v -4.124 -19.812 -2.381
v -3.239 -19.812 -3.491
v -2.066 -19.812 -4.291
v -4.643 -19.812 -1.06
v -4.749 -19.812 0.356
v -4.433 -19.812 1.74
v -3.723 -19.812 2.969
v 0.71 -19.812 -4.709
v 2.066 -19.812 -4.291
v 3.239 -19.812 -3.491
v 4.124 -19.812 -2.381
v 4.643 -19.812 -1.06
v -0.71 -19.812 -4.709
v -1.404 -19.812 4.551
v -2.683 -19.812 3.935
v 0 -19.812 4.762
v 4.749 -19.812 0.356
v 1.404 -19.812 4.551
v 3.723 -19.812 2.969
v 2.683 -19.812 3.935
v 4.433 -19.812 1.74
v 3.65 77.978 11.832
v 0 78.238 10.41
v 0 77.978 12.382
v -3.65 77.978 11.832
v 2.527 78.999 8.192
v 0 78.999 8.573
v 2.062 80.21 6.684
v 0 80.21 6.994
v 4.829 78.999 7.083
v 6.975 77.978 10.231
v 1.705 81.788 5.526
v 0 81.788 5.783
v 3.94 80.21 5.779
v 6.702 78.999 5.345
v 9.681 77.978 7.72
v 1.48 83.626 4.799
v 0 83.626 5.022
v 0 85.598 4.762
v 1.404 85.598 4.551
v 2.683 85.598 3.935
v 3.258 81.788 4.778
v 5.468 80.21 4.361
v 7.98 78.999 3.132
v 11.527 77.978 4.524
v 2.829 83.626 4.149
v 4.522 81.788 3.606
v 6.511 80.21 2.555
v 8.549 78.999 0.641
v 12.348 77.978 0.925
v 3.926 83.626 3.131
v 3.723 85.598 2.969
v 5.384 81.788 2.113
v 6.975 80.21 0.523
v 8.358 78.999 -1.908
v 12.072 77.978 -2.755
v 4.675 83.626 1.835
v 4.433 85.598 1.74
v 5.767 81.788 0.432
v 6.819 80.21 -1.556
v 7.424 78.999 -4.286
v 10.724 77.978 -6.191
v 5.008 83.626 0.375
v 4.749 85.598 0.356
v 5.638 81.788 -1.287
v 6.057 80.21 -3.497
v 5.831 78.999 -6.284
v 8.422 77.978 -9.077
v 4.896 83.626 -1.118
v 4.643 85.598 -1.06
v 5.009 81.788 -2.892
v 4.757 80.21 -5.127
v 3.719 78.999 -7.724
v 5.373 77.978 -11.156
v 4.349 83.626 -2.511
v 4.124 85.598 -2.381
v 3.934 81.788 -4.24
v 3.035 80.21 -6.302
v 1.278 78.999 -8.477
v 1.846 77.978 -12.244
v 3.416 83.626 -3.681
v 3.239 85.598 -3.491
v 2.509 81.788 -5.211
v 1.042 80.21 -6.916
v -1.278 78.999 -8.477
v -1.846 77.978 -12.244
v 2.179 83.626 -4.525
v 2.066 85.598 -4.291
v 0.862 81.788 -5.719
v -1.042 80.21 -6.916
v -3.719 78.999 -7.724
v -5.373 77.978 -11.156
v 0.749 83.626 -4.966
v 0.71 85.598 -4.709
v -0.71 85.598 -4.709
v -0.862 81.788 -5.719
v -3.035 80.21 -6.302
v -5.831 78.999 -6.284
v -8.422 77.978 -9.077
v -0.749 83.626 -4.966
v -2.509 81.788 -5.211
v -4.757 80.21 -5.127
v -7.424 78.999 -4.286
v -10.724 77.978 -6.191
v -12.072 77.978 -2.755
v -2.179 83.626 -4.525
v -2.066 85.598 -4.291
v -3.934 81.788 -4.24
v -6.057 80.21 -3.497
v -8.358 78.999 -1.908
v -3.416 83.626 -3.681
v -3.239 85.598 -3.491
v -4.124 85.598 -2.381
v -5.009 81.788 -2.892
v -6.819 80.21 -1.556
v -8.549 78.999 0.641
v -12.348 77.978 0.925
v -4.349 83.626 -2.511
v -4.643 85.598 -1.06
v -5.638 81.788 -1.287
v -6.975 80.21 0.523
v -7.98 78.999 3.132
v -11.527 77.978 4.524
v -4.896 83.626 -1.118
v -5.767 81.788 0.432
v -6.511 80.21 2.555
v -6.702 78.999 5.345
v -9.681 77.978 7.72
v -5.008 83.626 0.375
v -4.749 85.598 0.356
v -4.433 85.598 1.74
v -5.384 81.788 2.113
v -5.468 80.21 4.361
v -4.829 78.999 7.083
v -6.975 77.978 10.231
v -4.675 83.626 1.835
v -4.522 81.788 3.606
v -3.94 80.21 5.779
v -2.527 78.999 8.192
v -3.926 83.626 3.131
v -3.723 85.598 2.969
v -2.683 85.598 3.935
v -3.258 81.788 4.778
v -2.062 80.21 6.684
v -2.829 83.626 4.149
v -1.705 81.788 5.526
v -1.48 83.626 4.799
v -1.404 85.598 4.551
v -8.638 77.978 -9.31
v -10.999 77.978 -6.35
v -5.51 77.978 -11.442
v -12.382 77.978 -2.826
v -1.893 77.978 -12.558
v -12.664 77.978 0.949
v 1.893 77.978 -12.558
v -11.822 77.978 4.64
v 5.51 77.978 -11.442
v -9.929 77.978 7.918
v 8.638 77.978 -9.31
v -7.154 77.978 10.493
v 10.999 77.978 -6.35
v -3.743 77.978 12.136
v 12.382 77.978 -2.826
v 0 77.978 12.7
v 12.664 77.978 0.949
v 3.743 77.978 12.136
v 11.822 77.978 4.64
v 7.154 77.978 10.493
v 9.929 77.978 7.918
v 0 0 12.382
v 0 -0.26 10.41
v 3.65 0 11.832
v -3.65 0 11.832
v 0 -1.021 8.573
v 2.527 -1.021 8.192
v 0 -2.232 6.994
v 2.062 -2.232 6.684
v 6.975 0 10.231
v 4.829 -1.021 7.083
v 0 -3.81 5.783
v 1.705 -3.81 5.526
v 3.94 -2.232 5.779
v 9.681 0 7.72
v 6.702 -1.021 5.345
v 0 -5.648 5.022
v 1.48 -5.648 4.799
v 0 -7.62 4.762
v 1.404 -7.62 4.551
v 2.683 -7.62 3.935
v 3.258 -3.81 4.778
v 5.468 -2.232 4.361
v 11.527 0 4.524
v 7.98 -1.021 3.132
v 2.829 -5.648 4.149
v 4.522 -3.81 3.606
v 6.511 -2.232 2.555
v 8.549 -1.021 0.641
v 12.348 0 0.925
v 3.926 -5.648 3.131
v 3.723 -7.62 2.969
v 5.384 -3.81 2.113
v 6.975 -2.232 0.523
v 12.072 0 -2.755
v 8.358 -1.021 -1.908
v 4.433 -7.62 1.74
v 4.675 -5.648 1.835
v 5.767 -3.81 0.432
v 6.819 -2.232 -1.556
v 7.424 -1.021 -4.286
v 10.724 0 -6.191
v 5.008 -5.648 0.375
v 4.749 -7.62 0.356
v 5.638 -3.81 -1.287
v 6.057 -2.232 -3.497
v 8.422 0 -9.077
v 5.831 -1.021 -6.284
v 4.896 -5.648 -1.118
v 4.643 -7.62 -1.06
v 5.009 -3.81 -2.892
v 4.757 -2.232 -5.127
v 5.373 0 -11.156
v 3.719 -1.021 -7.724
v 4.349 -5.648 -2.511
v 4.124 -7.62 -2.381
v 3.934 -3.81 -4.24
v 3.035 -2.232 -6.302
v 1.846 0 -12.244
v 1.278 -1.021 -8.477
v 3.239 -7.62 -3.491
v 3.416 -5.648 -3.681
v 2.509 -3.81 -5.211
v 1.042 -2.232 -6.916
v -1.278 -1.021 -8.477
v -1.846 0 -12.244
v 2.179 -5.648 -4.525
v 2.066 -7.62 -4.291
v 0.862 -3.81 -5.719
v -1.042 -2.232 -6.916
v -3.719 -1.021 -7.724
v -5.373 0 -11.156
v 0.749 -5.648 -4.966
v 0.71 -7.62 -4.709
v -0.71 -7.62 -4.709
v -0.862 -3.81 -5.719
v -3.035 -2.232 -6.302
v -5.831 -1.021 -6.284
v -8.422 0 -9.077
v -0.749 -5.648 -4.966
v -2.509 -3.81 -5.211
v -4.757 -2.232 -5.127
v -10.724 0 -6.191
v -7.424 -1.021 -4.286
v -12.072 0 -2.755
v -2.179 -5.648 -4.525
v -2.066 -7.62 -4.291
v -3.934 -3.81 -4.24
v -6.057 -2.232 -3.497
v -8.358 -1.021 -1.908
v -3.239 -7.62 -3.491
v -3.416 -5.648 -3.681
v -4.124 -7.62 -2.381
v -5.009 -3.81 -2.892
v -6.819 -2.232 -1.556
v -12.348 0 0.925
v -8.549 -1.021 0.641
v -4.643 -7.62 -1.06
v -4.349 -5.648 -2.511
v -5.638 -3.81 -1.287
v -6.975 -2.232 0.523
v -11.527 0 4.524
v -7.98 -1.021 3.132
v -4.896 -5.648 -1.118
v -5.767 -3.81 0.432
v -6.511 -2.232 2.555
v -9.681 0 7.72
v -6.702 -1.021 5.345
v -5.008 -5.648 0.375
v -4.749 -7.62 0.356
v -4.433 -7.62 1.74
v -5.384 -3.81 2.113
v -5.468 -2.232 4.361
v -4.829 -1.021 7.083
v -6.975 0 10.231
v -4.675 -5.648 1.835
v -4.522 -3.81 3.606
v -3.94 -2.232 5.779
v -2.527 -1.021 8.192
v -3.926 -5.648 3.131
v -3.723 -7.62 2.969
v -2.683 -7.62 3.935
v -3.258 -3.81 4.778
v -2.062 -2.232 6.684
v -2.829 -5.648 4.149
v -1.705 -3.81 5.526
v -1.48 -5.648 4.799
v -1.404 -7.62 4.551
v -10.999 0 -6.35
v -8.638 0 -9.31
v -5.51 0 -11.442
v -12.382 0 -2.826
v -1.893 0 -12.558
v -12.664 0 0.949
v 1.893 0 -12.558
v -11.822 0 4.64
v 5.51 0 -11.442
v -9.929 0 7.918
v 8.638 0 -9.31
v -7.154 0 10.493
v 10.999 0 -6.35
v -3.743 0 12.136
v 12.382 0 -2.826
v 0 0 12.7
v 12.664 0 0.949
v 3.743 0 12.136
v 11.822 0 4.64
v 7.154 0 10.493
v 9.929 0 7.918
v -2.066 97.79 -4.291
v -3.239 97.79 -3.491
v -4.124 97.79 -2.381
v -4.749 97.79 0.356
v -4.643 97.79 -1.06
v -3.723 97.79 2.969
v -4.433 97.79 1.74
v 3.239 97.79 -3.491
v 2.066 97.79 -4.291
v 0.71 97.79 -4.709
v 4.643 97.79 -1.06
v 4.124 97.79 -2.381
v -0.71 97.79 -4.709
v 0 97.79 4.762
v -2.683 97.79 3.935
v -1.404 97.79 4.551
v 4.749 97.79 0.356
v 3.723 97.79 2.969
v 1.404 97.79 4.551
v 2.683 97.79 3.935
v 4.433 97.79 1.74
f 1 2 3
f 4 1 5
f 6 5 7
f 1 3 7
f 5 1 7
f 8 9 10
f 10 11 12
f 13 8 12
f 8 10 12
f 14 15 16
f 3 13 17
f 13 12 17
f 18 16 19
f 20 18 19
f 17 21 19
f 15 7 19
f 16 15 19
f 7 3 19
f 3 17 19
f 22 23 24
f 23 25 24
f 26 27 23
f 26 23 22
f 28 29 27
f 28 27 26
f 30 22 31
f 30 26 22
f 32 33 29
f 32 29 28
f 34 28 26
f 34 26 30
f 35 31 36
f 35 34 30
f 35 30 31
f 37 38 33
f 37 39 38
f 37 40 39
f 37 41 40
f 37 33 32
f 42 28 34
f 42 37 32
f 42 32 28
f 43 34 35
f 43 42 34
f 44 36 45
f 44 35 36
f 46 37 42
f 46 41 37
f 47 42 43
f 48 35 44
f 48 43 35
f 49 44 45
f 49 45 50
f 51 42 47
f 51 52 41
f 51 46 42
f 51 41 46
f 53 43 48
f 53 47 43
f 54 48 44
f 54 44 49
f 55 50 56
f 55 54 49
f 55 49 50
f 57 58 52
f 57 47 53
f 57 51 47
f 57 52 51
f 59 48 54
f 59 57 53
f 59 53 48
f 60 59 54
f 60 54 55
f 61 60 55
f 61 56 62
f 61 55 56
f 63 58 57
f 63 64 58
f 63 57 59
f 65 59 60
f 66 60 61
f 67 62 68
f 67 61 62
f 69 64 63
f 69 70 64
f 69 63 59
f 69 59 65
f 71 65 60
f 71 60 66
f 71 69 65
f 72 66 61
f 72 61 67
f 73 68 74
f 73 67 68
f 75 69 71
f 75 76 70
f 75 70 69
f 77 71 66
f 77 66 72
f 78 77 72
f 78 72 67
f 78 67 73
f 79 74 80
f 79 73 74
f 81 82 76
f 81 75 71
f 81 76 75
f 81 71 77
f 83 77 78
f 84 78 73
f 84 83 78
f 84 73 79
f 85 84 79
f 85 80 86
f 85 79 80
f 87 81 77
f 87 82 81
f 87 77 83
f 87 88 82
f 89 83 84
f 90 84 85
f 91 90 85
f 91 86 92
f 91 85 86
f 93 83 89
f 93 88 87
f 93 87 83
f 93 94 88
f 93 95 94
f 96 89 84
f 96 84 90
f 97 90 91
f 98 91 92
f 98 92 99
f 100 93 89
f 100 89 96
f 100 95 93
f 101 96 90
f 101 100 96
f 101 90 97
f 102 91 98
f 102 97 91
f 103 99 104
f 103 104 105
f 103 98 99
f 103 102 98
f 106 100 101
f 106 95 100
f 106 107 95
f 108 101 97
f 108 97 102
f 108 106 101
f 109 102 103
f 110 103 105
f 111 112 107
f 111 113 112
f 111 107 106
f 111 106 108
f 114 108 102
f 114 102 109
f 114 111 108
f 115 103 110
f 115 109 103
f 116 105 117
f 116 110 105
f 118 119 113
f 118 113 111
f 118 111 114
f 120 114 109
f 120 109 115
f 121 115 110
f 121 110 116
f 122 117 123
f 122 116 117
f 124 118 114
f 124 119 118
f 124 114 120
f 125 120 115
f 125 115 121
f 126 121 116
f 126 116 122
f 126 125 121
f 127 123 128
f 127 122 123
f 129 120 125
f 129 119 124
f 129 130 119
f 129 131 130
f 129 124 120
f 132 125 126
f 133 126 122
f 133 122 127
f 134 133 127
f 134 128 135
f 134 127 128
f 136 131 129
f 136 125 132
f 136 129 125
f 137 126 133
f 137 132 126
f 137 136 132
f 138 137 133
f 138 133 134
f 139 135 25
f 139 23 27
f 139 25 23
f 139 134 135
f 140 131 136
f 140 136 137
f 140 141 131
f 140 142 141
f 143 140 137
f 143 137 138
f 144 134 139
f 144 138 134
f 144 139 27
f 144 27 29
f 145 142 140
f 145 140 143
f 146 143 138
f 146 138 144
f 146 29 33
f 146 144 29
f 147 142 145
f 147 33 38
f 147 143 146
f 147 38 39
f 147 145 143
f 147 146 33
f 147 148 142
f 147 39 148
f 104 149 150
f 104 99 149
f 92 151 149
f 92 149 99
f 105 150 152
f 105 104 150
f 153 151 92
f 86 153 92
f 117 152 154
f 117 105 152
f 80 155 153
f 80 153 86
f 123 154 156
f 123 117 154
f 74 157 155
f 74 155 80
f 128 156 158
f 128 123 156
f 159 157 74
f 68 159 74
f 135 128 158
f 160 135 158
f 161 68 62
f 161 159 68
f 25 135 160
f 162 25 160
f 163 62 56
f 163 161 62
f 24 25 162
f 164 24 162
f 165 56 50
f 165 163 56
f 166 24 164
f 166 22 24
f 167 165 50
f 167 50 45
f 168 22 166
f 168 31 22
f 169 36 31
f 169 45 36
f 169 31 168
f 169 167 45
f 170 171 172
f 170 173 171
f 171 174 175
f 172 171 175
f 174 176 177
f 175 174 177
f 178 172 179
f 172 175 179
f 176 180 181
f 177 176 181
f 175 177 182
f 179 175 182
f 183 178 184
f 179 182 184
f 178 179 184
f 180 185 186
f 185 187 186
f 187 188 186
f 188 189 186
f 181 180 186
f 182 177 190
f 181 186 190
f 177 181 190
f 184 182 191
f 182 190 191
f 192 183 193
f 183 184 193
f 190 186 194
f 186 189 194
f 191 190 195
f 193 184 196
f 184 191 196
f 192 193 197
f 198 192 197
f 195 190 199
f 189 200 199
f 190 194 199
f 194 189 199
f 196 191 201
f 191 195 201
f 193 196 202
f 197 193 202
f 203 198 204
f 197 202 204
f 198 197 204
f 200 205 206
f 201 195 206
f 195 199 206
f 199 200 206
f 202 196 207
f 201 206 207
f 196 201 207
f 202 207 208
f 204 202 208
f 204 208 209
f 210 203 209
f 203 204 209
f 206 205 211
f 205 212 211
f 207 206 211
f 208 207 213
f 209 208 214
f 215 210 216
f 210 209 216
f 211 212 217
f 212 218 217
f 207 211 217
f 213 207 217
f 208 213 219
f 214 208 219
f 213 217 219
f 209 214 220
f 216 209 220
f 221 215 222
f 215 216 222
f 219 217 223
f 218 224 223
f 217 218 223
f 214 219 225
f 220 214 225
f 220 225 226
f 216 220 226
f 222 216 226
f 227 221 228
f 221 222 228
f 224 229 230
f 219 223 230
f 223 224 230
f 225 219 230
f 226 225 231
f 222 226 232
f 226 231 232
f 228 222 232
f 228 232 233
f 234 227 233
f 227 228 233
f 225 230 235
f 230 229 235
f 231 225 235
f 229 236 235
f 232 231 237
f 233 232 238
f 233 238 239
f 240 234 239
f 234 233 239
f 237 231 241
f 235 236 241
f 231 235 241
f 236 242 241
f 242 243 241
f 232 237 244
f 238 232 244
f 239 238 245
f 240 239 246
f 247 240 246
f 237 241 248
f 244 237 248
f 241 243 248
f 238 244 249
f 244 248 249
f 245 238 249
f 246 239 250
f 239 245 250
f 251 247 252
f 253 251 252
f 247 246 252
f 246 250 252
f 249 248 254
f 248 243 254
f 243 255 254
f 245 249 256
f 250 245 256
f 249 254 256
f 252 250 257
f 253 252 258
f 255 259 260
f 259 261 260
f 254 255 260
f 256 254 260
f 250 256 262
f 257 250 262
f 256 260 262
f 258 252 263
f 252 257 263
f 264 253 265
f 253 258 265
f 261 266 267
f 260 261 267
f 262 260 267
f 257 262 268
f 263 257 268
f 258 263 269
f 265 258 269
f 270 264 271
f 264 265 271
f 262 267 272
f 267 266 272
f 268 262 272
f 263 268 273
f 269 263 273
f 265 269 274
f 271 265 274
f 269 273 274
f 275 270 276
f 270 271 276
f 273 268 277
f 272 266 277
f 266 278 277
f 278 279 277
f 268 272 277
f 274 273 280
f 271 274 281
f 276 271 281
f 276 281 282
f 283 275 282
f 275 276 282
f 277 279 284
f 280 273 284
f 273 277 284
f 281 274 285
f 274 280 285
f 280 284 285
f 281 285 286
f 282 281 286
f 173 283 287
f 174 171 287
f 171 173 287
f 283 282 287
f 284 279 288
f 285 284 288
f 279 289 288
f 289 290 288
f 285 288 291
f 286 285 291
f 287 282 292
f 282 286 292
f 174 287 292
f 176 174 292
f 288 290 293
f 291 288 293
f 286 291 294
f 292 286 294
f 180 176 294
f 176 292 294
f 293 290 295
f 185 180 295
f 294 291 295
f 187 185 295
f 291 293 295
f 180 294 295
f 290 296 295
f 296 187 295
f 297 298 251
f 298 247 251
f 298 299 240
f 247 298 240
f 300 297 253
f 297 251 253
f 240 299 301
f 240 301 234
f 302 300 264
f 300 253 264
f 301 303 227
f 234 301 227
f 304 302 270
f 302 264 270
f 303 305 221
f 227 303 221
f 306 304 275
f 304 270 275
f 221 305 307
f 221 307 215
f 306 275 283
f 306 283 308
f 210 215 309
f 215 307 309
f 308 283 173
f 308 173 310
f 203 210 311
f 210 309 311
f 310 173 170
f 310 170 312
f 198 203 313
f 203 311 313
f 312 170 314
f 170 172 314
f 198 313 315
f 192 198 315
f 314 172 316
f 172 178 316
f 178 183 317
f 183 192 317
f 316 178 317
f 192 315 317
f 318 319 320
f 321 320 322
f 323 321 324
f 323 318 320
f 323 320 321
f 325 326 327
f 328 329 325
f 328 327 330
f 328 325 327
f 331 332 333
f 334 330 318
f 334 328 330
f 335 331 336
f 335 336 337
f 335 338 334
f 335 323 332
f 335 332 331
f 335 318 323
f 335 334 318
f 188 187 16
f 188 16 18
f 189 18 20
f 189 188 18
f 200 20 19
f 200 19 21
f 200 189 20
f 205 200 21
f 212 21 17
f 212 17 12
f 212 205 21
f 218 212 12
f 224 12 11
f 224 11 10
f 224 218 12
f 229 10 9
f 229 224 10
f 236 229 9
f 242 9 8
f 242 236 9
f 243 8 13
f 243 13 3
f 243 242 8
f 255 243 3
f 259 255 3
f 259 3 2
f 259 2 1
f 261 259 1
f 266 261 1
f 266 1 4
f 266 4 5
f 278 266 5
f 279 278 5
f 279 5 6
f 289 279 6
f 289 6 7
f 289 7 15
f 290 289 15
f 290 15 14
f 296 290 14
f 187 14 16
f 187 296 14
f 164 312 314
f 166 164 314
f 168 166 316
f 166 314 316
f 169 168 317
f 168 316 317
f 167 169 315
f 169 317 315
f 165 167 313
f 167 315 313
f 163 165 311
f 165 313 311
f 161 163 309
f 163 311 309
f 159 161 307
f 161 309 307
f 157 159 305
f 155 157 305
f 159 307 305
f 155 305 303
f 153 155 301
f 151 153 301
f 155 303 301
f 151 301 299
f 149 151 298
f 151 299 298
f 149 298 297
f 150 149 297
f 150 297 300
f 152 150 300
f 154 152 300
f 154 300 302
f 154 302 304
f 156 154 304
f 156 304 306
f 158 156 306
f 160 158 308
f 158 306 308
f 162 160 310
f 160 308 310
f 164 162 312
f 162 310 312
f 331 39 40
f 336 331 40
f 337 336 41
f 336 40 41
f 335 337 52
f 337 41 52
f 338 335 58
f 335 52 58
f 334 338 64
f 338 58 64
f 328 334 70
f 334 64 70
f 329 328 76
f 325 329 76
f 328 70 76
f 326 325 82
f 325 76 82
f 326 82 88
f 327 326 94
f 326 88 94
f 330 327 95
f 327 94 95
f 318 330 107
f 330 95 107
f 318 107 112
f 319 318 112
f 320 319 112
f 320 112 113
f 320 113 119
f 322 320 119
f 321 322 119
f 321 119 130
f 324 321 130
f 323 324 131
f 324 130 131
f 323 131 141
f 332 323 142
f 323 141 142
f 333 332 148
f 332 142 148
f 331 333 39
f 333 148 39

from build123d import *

# Parameters (mm, degrees)
SKETCH1_R           = 12.7
BOSS_EXTRUDE1_DEPTH = 77.978
SKETCH2_R           = 4.7625
BOSS_EXTRUDE2_DEPTH = 19.812
FILLET1_R           = 7.62


with BuildPart() as part:
    # Sketch1 → Boss-Extrude1 (new body)
    with BuildSketch(Plane(origin=(0, 0, 0), x_dir=(1, 0, 0), z_dir=(0, 1, 0))):
        with Locations(Location((0, 0, 0), (0, 0, 270))):
            Circle(SKETCH1_R)
    extrude(amount=BOSS_EXTRUDE1_DEPTH)

    # Sketch2 → Boss-Extrude2 (add)
    with BuildSketch(Plane(origin=(0, 77.978, 0), x_dir=(1, 0, 0), z_dir=(0, 1, 0))):
        with Locations(Location((0, 0, 0), (0, 0, 270))):
            Circle(SKETCH2_R)
    boss_extrude2 = extrude(amount=BOSS_EXTRUDE2_DEPTH)

    # Mirror1: Boss-Extrude2 across plane
    add(boss_extrude2.mirror(Plane.ZX.offset(38.989)))

    # Fillet1
    fillet1_edges = [part.edges().sort_by_distance(p)[0] for p in [
        (0, 0, -4.7625),
        (0, 77.978, -4.7625),
    ]]
    fillet(fillet1_edges, radius=FILLET1_R)


solid = part.part
